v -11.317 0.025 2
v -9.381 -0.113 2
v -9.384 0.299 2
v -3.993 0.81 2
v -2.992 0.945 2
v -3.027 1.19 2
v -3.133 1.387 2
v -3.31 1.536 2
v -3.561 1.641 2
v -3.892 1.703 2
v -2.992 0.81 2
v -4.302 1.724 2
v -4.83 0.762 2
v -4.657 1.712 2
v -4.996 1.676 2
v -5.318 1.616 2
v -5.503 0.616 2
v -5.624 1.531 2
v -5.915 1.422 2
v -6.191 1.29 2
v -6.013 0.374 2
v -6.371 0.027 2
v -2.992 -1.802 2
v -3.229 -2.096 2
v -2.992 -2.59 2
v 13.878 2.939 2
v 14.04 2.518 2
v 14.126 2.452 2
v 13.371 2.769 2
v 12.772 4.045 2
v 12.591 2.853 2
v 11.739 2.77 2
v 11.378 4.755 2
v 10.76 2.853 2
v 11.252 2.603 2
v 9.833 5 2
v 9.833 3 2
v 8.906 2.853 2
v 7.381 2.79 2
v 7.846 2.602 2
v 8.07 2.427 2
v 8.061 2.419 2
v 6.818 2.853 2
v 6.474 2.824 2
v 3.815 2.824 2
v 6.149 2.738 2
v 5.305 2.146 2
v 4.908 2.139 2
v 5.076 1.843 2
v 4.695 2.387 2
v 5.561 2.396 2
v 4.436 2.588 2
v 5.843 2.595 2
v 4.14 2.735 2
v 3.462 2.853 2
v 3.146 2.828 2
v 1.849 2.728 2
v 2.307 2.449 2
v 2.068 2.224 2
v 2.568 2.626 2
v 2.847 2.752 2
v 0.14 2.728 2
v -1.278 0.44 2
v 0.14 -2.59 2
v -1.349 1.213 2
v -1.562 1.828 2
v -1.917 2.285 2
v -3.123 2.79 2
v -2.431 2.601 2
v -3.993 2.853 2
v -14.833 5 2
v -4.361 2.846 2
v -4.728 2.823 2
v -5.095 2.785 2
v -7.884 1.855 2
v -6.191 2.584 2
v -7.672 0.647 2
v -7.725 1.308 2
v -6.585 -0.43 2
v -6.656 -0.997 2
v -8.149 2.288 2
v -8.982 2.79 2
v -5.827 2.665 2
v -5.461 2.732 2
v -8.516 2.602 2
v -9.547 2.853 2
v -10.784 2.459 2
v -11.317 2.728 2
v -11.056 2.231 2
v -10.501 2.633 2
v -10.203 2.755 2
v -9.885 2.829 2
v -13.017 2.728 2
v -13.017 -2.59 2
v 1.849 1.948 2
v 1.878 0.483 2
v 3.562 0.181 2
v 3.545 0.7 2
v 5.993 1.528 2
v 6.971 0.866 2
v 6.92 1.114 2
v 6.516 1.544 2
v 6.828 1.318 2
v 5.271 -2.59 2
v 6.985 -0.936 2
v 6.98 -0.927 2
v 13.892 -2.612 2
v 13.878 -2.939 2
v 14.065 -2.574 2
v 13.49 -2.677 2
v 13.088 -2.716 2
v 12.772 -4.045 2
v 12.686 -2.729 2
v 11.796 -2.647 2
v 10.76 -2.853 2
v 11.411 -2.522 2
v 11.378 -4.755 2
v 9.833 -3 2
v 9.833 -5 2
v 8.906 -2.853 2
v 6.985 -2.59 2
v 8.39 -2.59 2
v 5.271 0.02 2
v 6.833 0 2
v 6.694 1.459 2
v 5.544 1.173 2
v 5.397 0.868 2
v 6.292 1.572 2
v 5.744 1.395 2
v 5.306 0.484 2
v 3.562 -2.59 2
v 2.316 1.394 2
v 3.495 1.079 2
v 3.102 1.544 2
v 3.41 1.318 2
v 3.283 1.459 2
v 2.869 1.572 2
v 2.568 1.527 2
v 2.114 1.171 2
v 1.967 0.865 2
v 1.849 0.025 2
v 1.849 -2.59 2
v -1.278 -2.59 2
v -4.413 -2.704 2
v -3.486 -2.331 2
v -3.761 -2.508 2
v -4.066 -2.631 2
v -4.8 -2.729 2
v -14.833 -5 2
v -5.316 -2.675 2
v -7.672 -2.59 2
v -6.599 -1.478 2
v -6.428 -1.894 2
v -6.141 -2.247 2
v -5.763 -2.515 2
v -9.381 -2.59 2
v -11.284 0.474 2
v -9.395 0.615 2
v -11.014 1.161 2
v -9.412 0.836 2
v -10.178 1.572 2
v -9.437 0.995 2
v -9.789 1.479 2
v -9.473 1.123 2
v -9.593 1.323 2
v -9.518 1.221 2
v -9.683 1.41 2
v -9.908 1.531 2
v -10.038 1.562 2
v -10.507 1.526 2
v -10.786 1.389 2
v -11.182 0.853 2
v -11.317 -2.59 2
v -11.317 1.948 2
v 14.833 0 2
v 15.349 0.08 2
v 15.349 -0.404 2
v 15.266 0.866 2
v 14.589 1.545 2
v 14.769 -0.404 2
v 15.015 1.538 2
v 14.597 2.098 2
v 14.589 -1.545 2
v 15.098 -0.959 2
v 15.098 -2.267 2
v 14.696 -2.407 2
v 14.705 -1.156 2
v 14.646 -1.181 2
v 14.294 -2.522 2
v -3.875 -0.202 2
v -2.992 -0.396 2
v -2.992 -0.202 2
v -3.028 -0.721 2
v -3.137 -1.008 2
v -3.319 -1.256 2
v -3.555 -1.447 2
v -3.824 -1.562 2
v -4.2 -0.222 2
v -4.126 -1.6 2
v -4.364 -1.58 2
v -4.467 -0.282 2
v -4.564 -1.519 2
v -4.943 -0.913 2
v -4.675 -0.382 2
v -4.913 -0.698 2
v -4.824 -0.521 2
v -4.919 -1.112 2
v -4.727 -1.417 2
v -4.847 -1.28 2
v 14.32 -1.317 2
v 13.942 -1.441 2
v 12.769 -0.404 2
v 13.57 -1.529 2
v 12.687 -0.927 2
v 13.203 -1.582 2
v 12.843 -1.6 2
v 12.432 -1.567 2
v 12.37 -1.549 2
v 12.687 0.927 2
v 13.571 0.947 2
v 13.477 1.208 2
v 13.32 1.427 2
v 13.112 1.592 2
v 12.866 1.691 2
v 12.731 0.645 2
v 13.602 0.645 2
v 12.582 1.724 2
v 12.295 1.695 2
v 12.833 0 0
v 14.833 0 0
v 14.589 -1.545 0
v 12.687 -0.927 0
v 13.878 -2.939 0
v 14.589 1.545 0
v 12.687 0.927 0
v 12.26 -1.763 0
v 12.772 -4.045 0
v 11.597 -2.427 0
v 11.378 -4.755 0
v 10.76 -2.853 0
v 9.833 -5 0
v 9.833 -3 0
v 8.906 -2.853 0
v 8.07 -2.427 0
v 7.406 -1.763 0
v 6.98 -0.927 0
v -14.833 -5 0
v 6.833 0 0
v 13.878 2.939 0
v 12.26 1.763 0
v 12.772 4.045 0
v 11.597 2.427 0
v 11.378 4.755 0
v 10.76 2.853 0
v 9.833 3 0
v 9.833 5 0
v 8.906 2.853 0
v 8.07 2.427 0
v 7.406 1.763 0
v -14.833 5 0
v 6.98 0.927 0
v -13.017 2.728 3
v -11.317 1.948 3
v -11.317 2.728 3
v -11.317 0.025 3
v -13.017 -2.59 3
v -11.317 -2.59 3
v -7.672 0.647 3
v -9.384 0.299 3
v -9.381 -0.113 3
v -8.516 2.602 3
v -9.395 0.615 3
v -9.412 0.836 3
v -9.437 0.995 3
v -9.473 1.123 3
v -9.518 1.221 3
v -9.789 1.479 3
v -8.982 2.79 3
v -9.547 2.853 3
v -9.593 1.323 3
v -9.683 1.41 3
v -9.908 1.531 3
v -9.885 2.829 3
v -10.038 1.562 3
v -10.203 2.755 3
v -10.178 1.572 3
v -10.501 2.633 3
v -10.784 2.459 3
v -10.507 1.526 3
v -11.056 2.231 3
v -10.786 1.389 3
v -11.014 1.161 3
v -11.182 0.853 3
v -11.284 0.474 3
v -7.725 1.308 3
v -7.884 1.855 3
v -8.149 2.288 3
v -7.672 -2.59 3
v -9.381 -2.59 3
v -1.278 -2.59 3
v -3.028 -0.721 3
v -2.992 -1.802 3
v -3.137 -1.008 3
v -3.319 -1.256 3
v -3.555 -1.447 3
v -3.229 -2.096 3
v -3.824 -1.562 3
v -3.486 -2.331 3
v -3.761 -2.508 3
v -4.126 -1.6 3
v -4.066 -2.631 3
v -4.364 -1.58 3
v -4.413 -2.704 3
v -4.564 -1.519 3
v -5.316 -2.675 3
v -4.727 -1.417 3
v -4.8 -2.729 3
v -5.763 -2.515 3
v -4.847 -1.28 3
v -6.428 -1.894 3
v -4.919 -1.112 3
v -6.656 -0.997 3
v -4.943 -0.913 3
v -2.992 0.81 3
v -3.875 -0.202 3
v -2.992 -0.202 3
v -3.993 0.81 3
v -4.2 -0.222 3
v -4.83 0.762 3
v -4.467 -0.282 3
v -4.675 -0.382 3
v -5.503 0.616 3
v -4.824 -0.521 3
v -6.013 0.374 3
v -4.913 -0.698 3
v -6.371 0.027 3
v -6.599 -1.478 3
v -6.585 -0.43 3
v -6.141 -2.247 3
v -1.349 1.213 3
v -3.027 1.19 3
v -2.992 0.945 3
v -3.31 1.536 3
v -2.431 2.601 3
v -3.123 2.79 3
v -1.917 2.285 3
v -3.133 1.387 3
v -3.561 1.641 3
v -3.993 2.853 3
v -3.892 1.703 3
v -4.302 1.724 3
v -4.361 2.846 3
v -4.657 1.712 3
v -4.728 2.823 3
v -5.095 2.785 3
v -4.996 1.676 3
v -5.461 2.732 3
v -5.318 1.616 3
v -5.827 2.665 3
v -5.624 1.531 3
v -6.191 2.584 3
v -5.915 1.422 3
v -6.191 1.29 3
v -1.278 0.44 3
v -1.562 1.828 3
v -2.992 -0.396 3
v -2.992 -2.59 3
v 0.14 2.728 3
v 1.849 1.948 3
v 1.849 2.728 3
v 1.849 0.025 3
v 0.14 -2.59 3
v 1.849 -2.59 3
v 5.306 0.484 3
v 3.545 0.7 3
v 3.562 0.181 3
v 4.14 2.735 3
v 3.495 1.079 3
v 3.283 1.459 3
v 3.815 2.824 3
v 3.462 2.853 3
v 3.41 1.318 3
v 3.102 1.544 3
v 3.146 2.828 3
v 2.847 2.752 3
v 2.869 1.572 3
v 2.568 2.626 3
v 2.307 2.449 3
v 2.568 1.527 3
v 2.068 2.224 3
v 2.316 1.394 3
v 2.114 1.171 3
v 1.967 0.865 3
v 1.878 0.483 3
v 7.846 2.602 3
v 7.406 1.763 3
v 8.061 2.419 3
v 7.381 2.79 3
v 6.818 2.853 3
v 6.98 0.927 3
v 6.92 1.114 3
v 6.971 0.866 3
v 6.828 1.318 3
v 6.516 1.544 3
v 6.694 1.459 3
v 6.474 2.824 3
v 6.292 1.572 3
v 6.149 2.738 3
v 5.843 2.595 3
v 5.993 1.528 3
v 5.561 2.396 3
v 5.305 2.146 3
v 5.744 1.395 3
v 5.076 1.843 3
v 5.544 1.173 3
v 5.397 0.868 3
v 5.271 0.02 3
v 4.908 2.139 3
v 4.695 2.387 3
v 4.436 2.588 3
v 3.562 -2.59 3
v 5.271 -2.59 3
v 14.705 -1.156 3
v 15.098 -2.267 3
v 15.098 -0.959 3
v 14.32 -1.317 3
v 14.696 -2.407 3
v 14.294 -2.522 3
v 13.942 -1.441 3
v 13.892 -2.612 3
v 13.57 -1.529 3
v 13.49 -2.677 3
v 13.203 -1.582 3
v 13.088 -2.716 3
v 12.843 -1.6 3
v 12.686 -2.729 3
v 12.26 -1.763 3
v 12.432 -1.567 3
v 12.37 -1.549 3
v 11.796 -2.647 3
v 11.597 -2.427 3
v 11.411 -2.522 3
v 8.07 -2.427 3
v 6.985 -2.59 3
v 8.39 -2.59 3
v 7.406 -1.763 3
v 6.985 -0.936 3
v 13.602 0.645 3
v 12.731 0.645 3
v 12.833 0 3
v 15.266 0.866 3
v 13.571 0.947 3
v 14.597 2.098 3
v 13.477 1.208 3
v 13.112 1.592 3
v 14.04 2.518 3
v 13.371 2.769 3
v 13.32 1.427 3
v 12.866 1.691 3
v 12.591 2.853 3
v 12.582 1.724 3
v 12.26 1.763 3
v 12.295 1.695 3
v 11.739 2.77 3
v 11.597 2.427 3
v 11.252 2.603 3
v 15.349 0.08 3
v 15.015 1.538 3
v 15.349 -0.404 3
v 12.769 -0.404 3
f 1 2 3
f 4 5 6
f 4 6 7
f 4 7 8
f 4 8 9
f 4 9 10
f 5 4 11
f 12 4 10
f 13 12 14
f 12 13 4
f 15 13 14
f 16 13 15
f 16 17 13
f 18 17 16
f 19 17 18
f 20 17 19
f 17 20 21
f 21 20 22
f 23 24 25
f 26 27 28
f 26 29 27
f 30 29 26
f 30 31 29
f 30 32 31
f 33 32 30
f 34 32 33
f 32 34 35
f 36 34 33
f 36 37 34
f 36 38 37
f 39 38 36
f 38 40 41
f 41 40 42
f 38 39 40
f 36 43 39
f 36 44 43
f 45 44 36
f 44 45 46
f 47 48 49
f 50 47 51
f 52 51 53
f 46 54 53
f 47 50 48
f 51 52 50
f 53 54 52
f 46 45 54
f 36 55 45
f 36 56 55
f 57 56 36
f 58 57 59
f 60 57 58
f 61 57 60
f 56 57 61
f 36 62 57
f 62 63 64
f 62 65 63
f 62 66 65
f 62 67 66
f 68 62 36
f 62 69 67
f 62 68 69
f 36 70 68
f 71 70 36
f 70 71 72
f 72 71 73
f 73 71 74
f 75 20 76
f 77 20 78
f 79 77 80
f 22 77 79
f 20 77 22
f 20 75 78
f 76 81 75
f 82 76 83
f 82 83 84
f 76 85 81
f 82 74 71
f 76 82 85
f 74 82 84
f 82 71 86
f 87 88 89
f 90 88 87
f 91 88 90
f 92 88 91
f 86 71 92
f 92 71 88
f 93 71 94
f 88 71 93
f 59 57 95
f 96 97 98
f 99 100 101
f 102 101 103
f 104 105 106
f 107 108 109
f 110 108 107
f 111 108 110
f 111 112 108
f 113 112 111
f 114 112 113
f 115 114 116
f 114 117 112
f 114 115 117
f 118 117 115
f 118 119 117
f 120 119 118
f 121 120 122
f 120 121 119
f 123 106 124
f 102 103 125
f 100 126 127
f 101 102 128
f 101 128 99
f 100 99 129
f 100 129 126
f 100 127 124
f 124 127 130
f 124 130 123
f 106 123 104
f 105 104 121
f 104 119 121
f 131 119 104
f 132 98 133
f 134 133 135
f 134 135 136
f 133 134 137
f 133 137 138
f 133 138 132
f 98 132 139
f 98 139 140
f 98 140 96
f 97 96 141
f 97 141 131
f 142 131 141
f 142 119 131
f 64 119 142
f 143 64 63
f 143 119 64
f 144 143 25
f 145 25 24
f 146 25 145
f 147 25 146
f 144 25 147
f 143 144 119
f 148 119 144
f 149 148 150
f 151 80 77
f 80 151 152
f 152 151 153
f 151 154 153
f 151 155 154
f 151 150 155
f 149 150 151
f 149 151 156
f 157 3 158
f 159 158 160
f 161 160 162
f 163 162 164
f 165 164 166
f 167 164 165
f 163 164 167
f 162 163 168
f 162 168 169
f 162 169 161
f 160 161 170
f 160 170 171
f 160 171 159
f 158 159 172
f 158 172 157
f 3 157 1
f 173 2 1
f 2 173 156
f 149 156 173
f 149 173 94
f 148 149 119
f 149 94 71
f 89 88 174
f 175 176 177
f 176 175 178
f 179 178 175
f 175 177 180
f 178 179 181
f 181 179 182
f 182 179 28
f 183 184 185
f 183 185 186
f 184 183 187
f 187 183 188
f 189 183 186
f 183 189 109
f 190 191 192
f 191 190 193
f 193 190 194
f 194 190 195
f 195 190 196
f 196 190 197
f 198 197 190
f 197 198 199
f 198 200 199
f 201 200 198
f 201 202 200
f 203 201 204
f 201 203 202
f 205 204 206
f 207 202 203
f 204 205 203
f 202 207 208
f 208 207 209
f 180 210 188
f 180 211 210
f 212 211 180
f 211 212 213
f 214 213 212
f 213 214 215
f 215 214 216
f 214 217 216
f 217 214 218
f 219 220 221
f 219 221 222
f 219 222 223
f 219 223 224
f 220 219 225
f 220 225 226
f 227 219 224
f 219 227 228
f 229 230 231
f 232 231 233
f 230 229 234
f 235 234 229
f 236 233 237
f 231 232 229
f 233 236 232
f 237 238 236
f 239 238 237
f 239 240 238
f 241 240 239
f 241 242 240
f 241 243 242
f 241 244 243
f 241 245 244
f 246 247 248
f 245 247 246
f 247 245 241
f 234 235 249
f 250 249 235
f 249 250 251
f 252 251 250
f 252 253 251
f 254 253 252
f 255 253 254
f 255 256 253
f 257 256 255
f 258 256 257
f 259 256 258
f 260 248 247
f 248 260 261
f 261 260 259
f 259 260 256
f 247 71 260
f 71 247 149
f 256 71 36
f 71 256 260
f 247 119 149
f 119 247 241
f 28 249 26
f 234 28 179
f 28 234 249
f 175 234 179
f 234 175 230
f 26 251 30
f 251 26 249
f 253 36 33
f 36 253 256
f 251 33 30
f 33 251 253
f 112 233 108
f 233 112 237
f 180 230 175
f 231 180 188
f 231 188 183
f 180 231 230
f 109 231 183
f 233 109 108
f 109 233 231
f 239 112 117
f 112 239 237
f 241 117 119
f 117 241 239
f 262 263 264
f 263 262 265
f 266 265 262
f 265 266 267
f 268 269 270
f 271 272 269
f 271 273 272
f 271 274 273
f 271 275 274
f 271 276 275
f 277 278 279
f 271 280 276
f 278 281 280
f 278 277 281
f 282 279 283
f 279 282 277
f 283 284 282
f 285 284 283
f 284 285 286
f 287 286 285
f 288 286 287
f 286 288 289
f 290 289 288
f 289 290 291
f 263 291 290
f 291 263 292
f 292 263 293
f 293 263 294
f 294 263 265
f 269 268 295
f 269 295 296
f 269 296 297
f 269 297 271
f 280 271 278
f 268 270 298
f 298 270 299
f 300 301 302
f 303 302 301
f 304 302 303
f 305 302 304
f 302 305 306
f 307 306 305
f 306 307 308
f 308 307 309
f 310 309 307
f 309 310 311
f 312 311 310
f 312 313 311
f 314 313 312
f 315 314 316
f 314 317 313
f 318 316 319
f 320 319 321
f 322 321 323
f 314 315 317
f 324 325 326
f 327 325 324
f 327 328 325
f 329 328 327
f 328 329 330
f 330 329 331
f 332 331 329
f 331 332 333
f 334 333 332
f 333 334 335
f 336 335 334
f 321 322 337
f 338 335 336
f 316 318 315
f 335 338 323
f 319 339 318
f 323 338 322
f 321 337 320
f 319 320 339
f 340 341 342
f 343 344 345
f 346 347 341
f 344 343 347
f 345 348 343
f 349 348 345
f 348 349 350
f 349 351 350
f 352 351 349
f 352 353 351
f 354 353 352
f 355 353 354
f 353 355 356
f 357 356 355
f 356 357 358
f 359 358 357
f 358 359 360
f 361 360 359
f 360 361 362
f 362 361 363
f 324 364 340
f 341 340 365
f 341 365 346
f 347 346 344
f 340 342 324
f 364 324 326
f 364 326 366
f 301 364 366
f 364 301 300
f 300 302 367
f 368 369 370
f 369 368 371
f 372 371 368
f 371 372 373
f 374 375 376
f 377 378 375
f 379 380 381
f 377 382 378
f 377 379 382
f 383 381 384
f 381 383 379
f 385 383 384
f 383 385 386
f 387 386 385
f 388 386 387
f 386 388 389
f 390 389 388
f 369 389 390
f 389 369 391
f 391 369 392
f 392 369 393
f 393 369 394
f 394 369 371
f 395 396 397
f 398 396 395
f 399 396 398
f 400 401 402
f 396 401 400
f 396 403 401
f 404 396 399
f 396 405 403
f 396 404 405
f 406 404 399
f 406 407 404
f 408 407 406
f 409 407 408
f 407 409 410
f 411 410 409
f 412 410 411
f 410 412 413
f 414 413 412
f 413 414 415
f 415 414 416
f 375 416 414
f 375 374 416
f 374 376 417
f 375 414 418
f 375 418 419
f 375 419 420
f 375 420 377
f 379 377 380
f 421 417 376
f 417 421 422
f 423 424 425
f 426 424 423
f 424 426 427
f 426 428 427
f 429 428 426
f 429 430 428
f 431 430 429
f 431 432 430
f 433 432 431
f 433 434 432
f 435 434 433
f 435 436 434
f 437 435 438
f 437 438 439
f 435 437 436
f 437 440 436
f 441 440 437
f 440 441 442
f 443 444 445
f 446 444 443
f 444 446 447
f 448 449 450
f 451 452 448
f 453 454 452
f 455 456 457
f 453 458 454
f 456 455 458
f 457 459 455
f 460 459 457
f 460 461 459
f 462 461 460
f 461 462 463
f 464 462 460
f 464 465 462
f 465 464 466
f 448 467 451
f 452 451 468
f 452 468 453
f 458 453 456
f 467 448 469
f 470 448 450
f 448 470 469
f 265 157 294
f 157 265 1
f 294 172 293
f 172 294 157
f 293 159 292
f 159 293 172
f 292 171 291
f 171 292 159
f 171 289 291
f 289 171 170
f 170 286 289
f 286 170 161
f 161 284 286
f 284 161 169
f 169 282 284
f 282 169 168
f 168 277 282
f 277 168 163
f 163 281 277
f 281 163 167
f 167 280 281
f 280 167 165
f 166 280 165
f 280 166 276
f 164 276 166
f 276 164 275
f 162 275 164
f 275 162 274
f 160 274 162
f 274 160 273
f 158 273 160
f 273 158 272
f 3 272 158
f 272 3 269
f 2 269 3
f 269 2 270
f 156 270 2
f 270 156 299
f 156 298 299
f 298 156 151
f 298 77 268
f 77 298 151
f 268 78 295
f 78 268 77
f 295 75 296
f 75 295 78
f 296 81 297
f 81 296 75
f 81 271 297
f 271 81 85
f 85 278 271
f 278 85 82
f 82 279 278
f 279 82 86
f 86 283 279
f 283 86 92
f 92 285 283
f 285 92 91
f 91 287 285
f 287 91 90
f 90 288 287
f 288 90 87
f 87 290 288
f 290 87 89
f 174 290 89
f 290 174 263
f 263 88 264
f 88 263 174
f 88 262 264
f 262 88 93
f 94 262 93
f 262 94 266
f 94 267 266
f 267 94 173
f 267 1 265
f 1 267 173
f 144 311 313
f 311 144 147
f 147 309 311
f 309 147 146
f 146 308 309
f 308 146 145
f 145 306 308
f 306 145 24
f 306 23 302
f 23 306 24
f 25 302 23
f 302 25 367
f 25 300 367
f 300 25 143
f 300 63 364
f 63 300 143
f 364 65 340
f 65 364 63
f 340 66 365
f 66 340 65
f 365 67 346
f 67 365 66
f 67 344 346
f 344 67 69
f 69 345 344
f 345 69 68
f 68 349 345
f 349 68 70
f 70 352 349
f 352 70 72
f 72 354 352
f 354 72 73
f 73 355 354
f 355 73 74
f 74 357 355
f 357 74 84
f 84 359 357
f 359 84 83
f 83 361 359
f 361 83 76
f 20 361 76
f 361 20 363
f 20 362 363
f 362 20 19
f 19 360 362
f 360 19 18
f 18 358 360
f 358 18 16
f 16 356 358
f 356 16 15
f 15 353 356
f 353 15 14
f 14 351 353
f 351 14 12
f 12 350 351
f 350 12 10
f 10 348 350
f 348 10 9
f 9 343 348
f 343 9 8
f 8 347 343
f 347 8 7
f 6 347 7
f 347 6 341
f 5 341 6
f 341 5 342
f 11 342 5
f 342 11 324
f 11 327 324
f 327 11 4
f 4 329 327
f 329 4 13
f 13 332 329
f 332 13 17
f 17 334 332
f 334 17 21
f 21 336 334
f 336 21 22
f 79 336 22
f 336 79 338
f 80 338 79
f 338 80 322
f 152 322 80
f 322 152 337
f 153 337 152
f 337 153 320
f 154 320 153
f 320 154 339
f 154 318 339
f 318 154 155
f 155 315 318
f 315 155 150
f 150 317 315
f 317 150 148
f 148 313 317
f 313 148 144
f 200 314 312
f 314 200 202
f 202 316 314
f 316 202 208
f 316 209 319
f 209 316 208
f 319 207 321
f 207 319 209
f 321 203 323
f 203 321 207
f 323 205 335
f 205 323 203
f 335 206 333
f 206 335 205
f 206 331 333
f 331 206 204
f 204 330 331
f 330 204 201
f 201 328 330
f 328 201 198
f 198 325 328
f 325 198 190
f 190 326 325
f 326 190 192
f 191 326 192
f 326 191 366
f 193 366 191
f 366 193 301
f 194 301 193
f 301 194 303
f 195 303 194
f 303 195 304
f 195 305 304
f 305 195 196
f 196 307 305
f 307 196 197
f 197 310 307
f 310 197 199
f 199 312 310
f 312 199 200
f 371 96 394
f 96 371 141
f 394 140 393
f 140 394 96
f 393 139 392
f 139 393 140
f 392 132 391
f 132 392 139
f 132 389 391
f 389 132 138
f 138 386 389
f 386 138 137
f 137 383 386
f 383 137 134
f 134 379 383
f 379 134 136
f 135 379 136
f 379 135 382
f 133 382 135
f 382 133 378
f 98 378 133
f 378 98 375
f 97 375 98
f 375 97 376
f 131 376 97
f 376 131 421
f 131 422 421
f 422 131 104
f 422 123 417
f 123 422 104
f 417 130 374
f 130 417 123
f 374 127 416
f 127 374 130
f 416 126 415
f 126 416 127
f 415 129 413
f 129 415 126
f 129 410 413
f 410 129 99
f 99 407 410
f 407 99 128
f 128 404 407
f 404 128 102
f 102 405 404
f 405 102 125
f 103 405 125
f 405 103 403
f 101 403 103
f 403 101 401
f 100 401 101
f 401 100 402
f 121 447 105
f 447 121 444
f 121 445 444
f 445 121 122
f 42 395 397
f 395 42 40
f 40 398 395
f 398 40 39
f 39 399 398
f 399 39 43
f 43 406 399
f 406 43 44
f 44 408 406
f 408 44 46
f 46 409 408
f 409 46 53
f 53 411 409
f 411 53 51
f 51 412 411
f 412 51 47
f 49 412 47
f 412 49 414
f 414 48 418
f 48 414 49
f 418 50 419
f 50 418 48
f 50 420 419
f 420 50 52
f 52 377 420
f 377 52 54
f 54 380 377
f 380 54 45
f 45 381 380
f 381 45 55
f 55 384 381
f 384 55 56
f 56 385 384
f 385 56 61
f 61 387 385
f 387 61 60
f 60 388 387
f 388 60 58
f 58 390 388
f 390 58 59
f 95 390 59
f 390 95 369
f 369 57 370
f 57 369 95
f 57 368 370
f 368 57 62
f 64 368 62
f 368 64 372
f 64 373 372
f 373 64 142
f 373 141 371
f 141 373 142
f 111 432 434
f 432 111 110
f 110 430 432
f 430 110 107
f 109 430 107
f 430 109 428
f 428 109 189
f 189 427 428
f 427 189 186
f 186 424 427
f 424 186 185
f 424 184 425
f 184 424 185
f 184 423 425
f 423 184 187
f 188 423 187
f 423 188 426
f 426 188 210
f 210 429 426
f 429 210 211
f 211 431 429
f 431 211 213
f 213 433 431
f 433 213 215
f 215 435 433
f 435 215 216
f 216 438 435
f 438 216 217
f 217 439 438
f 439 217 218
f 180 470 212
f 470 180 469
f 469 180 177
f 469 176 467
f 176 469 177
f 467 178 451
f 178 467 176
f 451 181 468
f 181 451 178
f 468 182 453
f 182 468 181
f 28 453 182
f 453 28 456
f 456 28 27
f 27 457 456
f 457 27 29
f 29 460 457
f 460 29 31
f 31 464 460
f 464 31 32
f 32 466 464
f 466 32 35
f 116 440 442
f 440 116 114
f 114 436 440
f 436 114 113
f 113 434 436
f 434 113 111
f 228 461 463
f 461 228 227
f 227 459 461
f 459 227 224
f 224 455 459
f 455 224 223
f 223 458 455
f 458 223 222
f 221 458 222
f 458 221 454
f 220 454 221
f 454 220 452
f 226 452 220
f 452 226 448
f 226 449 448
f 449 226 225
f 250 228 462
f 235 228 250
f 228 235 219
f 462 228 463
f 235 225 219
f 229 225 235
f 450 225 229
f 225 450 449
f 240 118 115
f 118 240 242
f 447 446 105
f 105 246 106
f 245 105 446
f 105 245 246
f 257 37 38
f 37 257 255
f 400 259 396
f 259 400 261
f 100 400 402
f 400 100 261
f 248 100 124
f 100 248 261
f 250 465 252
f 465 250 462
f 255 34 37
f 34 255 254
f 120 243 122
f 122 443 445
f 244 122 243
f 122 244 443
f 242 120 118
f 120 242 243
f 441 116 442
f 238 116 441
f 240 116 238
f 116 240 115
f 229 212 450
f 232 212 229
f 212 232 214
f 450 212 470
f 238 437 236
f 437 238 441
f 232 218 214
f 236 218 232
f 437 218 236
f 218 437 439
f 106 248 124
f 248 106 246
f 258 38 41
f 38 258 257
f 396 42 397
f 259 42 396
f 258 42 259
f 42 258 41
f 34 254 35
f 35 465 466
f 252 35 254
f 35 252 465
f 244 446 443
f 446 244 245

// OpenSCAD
// Name plate generator. Feel free to edit any of the values!

// Your name
name = "name";
chars = 4;

// The thicknes of the text (Amount text sticks up by)
textthick = 1;
// The height of the text, if looking down from the top
textheight = 7;

// Lenght of the flat part
length = (textheight*(2/3))*chars+1;
// Width of the flat part
width = 10;
// Thickness of the flat part
thickness = 2;

$fn = 20;

translate([-(length+width)/2, -width/2, 0]){
	difference(){
		union(){
			// Make the flat part
			cube([length + width/2, width, thickness]);

			translate([length + width/2, width/2, 0]){
				cylinder(r=width/2, h=thickness);
			}

			//Move above the flat part
			translate([1, width/2, thickness]){
				// Make the text 3d
				color("yellow") linear_extrude(textthick, convexity=10){
					// Draw the text
					text(name, textheight, valign="center", font="Ubuntu Mono:style=Bold");
				}
			}
		}

		translate([length + width/2, width/2, -1]){
			cylinder(r=width/2-thickness, h=thickness+2);
		}
	}
}
//s
